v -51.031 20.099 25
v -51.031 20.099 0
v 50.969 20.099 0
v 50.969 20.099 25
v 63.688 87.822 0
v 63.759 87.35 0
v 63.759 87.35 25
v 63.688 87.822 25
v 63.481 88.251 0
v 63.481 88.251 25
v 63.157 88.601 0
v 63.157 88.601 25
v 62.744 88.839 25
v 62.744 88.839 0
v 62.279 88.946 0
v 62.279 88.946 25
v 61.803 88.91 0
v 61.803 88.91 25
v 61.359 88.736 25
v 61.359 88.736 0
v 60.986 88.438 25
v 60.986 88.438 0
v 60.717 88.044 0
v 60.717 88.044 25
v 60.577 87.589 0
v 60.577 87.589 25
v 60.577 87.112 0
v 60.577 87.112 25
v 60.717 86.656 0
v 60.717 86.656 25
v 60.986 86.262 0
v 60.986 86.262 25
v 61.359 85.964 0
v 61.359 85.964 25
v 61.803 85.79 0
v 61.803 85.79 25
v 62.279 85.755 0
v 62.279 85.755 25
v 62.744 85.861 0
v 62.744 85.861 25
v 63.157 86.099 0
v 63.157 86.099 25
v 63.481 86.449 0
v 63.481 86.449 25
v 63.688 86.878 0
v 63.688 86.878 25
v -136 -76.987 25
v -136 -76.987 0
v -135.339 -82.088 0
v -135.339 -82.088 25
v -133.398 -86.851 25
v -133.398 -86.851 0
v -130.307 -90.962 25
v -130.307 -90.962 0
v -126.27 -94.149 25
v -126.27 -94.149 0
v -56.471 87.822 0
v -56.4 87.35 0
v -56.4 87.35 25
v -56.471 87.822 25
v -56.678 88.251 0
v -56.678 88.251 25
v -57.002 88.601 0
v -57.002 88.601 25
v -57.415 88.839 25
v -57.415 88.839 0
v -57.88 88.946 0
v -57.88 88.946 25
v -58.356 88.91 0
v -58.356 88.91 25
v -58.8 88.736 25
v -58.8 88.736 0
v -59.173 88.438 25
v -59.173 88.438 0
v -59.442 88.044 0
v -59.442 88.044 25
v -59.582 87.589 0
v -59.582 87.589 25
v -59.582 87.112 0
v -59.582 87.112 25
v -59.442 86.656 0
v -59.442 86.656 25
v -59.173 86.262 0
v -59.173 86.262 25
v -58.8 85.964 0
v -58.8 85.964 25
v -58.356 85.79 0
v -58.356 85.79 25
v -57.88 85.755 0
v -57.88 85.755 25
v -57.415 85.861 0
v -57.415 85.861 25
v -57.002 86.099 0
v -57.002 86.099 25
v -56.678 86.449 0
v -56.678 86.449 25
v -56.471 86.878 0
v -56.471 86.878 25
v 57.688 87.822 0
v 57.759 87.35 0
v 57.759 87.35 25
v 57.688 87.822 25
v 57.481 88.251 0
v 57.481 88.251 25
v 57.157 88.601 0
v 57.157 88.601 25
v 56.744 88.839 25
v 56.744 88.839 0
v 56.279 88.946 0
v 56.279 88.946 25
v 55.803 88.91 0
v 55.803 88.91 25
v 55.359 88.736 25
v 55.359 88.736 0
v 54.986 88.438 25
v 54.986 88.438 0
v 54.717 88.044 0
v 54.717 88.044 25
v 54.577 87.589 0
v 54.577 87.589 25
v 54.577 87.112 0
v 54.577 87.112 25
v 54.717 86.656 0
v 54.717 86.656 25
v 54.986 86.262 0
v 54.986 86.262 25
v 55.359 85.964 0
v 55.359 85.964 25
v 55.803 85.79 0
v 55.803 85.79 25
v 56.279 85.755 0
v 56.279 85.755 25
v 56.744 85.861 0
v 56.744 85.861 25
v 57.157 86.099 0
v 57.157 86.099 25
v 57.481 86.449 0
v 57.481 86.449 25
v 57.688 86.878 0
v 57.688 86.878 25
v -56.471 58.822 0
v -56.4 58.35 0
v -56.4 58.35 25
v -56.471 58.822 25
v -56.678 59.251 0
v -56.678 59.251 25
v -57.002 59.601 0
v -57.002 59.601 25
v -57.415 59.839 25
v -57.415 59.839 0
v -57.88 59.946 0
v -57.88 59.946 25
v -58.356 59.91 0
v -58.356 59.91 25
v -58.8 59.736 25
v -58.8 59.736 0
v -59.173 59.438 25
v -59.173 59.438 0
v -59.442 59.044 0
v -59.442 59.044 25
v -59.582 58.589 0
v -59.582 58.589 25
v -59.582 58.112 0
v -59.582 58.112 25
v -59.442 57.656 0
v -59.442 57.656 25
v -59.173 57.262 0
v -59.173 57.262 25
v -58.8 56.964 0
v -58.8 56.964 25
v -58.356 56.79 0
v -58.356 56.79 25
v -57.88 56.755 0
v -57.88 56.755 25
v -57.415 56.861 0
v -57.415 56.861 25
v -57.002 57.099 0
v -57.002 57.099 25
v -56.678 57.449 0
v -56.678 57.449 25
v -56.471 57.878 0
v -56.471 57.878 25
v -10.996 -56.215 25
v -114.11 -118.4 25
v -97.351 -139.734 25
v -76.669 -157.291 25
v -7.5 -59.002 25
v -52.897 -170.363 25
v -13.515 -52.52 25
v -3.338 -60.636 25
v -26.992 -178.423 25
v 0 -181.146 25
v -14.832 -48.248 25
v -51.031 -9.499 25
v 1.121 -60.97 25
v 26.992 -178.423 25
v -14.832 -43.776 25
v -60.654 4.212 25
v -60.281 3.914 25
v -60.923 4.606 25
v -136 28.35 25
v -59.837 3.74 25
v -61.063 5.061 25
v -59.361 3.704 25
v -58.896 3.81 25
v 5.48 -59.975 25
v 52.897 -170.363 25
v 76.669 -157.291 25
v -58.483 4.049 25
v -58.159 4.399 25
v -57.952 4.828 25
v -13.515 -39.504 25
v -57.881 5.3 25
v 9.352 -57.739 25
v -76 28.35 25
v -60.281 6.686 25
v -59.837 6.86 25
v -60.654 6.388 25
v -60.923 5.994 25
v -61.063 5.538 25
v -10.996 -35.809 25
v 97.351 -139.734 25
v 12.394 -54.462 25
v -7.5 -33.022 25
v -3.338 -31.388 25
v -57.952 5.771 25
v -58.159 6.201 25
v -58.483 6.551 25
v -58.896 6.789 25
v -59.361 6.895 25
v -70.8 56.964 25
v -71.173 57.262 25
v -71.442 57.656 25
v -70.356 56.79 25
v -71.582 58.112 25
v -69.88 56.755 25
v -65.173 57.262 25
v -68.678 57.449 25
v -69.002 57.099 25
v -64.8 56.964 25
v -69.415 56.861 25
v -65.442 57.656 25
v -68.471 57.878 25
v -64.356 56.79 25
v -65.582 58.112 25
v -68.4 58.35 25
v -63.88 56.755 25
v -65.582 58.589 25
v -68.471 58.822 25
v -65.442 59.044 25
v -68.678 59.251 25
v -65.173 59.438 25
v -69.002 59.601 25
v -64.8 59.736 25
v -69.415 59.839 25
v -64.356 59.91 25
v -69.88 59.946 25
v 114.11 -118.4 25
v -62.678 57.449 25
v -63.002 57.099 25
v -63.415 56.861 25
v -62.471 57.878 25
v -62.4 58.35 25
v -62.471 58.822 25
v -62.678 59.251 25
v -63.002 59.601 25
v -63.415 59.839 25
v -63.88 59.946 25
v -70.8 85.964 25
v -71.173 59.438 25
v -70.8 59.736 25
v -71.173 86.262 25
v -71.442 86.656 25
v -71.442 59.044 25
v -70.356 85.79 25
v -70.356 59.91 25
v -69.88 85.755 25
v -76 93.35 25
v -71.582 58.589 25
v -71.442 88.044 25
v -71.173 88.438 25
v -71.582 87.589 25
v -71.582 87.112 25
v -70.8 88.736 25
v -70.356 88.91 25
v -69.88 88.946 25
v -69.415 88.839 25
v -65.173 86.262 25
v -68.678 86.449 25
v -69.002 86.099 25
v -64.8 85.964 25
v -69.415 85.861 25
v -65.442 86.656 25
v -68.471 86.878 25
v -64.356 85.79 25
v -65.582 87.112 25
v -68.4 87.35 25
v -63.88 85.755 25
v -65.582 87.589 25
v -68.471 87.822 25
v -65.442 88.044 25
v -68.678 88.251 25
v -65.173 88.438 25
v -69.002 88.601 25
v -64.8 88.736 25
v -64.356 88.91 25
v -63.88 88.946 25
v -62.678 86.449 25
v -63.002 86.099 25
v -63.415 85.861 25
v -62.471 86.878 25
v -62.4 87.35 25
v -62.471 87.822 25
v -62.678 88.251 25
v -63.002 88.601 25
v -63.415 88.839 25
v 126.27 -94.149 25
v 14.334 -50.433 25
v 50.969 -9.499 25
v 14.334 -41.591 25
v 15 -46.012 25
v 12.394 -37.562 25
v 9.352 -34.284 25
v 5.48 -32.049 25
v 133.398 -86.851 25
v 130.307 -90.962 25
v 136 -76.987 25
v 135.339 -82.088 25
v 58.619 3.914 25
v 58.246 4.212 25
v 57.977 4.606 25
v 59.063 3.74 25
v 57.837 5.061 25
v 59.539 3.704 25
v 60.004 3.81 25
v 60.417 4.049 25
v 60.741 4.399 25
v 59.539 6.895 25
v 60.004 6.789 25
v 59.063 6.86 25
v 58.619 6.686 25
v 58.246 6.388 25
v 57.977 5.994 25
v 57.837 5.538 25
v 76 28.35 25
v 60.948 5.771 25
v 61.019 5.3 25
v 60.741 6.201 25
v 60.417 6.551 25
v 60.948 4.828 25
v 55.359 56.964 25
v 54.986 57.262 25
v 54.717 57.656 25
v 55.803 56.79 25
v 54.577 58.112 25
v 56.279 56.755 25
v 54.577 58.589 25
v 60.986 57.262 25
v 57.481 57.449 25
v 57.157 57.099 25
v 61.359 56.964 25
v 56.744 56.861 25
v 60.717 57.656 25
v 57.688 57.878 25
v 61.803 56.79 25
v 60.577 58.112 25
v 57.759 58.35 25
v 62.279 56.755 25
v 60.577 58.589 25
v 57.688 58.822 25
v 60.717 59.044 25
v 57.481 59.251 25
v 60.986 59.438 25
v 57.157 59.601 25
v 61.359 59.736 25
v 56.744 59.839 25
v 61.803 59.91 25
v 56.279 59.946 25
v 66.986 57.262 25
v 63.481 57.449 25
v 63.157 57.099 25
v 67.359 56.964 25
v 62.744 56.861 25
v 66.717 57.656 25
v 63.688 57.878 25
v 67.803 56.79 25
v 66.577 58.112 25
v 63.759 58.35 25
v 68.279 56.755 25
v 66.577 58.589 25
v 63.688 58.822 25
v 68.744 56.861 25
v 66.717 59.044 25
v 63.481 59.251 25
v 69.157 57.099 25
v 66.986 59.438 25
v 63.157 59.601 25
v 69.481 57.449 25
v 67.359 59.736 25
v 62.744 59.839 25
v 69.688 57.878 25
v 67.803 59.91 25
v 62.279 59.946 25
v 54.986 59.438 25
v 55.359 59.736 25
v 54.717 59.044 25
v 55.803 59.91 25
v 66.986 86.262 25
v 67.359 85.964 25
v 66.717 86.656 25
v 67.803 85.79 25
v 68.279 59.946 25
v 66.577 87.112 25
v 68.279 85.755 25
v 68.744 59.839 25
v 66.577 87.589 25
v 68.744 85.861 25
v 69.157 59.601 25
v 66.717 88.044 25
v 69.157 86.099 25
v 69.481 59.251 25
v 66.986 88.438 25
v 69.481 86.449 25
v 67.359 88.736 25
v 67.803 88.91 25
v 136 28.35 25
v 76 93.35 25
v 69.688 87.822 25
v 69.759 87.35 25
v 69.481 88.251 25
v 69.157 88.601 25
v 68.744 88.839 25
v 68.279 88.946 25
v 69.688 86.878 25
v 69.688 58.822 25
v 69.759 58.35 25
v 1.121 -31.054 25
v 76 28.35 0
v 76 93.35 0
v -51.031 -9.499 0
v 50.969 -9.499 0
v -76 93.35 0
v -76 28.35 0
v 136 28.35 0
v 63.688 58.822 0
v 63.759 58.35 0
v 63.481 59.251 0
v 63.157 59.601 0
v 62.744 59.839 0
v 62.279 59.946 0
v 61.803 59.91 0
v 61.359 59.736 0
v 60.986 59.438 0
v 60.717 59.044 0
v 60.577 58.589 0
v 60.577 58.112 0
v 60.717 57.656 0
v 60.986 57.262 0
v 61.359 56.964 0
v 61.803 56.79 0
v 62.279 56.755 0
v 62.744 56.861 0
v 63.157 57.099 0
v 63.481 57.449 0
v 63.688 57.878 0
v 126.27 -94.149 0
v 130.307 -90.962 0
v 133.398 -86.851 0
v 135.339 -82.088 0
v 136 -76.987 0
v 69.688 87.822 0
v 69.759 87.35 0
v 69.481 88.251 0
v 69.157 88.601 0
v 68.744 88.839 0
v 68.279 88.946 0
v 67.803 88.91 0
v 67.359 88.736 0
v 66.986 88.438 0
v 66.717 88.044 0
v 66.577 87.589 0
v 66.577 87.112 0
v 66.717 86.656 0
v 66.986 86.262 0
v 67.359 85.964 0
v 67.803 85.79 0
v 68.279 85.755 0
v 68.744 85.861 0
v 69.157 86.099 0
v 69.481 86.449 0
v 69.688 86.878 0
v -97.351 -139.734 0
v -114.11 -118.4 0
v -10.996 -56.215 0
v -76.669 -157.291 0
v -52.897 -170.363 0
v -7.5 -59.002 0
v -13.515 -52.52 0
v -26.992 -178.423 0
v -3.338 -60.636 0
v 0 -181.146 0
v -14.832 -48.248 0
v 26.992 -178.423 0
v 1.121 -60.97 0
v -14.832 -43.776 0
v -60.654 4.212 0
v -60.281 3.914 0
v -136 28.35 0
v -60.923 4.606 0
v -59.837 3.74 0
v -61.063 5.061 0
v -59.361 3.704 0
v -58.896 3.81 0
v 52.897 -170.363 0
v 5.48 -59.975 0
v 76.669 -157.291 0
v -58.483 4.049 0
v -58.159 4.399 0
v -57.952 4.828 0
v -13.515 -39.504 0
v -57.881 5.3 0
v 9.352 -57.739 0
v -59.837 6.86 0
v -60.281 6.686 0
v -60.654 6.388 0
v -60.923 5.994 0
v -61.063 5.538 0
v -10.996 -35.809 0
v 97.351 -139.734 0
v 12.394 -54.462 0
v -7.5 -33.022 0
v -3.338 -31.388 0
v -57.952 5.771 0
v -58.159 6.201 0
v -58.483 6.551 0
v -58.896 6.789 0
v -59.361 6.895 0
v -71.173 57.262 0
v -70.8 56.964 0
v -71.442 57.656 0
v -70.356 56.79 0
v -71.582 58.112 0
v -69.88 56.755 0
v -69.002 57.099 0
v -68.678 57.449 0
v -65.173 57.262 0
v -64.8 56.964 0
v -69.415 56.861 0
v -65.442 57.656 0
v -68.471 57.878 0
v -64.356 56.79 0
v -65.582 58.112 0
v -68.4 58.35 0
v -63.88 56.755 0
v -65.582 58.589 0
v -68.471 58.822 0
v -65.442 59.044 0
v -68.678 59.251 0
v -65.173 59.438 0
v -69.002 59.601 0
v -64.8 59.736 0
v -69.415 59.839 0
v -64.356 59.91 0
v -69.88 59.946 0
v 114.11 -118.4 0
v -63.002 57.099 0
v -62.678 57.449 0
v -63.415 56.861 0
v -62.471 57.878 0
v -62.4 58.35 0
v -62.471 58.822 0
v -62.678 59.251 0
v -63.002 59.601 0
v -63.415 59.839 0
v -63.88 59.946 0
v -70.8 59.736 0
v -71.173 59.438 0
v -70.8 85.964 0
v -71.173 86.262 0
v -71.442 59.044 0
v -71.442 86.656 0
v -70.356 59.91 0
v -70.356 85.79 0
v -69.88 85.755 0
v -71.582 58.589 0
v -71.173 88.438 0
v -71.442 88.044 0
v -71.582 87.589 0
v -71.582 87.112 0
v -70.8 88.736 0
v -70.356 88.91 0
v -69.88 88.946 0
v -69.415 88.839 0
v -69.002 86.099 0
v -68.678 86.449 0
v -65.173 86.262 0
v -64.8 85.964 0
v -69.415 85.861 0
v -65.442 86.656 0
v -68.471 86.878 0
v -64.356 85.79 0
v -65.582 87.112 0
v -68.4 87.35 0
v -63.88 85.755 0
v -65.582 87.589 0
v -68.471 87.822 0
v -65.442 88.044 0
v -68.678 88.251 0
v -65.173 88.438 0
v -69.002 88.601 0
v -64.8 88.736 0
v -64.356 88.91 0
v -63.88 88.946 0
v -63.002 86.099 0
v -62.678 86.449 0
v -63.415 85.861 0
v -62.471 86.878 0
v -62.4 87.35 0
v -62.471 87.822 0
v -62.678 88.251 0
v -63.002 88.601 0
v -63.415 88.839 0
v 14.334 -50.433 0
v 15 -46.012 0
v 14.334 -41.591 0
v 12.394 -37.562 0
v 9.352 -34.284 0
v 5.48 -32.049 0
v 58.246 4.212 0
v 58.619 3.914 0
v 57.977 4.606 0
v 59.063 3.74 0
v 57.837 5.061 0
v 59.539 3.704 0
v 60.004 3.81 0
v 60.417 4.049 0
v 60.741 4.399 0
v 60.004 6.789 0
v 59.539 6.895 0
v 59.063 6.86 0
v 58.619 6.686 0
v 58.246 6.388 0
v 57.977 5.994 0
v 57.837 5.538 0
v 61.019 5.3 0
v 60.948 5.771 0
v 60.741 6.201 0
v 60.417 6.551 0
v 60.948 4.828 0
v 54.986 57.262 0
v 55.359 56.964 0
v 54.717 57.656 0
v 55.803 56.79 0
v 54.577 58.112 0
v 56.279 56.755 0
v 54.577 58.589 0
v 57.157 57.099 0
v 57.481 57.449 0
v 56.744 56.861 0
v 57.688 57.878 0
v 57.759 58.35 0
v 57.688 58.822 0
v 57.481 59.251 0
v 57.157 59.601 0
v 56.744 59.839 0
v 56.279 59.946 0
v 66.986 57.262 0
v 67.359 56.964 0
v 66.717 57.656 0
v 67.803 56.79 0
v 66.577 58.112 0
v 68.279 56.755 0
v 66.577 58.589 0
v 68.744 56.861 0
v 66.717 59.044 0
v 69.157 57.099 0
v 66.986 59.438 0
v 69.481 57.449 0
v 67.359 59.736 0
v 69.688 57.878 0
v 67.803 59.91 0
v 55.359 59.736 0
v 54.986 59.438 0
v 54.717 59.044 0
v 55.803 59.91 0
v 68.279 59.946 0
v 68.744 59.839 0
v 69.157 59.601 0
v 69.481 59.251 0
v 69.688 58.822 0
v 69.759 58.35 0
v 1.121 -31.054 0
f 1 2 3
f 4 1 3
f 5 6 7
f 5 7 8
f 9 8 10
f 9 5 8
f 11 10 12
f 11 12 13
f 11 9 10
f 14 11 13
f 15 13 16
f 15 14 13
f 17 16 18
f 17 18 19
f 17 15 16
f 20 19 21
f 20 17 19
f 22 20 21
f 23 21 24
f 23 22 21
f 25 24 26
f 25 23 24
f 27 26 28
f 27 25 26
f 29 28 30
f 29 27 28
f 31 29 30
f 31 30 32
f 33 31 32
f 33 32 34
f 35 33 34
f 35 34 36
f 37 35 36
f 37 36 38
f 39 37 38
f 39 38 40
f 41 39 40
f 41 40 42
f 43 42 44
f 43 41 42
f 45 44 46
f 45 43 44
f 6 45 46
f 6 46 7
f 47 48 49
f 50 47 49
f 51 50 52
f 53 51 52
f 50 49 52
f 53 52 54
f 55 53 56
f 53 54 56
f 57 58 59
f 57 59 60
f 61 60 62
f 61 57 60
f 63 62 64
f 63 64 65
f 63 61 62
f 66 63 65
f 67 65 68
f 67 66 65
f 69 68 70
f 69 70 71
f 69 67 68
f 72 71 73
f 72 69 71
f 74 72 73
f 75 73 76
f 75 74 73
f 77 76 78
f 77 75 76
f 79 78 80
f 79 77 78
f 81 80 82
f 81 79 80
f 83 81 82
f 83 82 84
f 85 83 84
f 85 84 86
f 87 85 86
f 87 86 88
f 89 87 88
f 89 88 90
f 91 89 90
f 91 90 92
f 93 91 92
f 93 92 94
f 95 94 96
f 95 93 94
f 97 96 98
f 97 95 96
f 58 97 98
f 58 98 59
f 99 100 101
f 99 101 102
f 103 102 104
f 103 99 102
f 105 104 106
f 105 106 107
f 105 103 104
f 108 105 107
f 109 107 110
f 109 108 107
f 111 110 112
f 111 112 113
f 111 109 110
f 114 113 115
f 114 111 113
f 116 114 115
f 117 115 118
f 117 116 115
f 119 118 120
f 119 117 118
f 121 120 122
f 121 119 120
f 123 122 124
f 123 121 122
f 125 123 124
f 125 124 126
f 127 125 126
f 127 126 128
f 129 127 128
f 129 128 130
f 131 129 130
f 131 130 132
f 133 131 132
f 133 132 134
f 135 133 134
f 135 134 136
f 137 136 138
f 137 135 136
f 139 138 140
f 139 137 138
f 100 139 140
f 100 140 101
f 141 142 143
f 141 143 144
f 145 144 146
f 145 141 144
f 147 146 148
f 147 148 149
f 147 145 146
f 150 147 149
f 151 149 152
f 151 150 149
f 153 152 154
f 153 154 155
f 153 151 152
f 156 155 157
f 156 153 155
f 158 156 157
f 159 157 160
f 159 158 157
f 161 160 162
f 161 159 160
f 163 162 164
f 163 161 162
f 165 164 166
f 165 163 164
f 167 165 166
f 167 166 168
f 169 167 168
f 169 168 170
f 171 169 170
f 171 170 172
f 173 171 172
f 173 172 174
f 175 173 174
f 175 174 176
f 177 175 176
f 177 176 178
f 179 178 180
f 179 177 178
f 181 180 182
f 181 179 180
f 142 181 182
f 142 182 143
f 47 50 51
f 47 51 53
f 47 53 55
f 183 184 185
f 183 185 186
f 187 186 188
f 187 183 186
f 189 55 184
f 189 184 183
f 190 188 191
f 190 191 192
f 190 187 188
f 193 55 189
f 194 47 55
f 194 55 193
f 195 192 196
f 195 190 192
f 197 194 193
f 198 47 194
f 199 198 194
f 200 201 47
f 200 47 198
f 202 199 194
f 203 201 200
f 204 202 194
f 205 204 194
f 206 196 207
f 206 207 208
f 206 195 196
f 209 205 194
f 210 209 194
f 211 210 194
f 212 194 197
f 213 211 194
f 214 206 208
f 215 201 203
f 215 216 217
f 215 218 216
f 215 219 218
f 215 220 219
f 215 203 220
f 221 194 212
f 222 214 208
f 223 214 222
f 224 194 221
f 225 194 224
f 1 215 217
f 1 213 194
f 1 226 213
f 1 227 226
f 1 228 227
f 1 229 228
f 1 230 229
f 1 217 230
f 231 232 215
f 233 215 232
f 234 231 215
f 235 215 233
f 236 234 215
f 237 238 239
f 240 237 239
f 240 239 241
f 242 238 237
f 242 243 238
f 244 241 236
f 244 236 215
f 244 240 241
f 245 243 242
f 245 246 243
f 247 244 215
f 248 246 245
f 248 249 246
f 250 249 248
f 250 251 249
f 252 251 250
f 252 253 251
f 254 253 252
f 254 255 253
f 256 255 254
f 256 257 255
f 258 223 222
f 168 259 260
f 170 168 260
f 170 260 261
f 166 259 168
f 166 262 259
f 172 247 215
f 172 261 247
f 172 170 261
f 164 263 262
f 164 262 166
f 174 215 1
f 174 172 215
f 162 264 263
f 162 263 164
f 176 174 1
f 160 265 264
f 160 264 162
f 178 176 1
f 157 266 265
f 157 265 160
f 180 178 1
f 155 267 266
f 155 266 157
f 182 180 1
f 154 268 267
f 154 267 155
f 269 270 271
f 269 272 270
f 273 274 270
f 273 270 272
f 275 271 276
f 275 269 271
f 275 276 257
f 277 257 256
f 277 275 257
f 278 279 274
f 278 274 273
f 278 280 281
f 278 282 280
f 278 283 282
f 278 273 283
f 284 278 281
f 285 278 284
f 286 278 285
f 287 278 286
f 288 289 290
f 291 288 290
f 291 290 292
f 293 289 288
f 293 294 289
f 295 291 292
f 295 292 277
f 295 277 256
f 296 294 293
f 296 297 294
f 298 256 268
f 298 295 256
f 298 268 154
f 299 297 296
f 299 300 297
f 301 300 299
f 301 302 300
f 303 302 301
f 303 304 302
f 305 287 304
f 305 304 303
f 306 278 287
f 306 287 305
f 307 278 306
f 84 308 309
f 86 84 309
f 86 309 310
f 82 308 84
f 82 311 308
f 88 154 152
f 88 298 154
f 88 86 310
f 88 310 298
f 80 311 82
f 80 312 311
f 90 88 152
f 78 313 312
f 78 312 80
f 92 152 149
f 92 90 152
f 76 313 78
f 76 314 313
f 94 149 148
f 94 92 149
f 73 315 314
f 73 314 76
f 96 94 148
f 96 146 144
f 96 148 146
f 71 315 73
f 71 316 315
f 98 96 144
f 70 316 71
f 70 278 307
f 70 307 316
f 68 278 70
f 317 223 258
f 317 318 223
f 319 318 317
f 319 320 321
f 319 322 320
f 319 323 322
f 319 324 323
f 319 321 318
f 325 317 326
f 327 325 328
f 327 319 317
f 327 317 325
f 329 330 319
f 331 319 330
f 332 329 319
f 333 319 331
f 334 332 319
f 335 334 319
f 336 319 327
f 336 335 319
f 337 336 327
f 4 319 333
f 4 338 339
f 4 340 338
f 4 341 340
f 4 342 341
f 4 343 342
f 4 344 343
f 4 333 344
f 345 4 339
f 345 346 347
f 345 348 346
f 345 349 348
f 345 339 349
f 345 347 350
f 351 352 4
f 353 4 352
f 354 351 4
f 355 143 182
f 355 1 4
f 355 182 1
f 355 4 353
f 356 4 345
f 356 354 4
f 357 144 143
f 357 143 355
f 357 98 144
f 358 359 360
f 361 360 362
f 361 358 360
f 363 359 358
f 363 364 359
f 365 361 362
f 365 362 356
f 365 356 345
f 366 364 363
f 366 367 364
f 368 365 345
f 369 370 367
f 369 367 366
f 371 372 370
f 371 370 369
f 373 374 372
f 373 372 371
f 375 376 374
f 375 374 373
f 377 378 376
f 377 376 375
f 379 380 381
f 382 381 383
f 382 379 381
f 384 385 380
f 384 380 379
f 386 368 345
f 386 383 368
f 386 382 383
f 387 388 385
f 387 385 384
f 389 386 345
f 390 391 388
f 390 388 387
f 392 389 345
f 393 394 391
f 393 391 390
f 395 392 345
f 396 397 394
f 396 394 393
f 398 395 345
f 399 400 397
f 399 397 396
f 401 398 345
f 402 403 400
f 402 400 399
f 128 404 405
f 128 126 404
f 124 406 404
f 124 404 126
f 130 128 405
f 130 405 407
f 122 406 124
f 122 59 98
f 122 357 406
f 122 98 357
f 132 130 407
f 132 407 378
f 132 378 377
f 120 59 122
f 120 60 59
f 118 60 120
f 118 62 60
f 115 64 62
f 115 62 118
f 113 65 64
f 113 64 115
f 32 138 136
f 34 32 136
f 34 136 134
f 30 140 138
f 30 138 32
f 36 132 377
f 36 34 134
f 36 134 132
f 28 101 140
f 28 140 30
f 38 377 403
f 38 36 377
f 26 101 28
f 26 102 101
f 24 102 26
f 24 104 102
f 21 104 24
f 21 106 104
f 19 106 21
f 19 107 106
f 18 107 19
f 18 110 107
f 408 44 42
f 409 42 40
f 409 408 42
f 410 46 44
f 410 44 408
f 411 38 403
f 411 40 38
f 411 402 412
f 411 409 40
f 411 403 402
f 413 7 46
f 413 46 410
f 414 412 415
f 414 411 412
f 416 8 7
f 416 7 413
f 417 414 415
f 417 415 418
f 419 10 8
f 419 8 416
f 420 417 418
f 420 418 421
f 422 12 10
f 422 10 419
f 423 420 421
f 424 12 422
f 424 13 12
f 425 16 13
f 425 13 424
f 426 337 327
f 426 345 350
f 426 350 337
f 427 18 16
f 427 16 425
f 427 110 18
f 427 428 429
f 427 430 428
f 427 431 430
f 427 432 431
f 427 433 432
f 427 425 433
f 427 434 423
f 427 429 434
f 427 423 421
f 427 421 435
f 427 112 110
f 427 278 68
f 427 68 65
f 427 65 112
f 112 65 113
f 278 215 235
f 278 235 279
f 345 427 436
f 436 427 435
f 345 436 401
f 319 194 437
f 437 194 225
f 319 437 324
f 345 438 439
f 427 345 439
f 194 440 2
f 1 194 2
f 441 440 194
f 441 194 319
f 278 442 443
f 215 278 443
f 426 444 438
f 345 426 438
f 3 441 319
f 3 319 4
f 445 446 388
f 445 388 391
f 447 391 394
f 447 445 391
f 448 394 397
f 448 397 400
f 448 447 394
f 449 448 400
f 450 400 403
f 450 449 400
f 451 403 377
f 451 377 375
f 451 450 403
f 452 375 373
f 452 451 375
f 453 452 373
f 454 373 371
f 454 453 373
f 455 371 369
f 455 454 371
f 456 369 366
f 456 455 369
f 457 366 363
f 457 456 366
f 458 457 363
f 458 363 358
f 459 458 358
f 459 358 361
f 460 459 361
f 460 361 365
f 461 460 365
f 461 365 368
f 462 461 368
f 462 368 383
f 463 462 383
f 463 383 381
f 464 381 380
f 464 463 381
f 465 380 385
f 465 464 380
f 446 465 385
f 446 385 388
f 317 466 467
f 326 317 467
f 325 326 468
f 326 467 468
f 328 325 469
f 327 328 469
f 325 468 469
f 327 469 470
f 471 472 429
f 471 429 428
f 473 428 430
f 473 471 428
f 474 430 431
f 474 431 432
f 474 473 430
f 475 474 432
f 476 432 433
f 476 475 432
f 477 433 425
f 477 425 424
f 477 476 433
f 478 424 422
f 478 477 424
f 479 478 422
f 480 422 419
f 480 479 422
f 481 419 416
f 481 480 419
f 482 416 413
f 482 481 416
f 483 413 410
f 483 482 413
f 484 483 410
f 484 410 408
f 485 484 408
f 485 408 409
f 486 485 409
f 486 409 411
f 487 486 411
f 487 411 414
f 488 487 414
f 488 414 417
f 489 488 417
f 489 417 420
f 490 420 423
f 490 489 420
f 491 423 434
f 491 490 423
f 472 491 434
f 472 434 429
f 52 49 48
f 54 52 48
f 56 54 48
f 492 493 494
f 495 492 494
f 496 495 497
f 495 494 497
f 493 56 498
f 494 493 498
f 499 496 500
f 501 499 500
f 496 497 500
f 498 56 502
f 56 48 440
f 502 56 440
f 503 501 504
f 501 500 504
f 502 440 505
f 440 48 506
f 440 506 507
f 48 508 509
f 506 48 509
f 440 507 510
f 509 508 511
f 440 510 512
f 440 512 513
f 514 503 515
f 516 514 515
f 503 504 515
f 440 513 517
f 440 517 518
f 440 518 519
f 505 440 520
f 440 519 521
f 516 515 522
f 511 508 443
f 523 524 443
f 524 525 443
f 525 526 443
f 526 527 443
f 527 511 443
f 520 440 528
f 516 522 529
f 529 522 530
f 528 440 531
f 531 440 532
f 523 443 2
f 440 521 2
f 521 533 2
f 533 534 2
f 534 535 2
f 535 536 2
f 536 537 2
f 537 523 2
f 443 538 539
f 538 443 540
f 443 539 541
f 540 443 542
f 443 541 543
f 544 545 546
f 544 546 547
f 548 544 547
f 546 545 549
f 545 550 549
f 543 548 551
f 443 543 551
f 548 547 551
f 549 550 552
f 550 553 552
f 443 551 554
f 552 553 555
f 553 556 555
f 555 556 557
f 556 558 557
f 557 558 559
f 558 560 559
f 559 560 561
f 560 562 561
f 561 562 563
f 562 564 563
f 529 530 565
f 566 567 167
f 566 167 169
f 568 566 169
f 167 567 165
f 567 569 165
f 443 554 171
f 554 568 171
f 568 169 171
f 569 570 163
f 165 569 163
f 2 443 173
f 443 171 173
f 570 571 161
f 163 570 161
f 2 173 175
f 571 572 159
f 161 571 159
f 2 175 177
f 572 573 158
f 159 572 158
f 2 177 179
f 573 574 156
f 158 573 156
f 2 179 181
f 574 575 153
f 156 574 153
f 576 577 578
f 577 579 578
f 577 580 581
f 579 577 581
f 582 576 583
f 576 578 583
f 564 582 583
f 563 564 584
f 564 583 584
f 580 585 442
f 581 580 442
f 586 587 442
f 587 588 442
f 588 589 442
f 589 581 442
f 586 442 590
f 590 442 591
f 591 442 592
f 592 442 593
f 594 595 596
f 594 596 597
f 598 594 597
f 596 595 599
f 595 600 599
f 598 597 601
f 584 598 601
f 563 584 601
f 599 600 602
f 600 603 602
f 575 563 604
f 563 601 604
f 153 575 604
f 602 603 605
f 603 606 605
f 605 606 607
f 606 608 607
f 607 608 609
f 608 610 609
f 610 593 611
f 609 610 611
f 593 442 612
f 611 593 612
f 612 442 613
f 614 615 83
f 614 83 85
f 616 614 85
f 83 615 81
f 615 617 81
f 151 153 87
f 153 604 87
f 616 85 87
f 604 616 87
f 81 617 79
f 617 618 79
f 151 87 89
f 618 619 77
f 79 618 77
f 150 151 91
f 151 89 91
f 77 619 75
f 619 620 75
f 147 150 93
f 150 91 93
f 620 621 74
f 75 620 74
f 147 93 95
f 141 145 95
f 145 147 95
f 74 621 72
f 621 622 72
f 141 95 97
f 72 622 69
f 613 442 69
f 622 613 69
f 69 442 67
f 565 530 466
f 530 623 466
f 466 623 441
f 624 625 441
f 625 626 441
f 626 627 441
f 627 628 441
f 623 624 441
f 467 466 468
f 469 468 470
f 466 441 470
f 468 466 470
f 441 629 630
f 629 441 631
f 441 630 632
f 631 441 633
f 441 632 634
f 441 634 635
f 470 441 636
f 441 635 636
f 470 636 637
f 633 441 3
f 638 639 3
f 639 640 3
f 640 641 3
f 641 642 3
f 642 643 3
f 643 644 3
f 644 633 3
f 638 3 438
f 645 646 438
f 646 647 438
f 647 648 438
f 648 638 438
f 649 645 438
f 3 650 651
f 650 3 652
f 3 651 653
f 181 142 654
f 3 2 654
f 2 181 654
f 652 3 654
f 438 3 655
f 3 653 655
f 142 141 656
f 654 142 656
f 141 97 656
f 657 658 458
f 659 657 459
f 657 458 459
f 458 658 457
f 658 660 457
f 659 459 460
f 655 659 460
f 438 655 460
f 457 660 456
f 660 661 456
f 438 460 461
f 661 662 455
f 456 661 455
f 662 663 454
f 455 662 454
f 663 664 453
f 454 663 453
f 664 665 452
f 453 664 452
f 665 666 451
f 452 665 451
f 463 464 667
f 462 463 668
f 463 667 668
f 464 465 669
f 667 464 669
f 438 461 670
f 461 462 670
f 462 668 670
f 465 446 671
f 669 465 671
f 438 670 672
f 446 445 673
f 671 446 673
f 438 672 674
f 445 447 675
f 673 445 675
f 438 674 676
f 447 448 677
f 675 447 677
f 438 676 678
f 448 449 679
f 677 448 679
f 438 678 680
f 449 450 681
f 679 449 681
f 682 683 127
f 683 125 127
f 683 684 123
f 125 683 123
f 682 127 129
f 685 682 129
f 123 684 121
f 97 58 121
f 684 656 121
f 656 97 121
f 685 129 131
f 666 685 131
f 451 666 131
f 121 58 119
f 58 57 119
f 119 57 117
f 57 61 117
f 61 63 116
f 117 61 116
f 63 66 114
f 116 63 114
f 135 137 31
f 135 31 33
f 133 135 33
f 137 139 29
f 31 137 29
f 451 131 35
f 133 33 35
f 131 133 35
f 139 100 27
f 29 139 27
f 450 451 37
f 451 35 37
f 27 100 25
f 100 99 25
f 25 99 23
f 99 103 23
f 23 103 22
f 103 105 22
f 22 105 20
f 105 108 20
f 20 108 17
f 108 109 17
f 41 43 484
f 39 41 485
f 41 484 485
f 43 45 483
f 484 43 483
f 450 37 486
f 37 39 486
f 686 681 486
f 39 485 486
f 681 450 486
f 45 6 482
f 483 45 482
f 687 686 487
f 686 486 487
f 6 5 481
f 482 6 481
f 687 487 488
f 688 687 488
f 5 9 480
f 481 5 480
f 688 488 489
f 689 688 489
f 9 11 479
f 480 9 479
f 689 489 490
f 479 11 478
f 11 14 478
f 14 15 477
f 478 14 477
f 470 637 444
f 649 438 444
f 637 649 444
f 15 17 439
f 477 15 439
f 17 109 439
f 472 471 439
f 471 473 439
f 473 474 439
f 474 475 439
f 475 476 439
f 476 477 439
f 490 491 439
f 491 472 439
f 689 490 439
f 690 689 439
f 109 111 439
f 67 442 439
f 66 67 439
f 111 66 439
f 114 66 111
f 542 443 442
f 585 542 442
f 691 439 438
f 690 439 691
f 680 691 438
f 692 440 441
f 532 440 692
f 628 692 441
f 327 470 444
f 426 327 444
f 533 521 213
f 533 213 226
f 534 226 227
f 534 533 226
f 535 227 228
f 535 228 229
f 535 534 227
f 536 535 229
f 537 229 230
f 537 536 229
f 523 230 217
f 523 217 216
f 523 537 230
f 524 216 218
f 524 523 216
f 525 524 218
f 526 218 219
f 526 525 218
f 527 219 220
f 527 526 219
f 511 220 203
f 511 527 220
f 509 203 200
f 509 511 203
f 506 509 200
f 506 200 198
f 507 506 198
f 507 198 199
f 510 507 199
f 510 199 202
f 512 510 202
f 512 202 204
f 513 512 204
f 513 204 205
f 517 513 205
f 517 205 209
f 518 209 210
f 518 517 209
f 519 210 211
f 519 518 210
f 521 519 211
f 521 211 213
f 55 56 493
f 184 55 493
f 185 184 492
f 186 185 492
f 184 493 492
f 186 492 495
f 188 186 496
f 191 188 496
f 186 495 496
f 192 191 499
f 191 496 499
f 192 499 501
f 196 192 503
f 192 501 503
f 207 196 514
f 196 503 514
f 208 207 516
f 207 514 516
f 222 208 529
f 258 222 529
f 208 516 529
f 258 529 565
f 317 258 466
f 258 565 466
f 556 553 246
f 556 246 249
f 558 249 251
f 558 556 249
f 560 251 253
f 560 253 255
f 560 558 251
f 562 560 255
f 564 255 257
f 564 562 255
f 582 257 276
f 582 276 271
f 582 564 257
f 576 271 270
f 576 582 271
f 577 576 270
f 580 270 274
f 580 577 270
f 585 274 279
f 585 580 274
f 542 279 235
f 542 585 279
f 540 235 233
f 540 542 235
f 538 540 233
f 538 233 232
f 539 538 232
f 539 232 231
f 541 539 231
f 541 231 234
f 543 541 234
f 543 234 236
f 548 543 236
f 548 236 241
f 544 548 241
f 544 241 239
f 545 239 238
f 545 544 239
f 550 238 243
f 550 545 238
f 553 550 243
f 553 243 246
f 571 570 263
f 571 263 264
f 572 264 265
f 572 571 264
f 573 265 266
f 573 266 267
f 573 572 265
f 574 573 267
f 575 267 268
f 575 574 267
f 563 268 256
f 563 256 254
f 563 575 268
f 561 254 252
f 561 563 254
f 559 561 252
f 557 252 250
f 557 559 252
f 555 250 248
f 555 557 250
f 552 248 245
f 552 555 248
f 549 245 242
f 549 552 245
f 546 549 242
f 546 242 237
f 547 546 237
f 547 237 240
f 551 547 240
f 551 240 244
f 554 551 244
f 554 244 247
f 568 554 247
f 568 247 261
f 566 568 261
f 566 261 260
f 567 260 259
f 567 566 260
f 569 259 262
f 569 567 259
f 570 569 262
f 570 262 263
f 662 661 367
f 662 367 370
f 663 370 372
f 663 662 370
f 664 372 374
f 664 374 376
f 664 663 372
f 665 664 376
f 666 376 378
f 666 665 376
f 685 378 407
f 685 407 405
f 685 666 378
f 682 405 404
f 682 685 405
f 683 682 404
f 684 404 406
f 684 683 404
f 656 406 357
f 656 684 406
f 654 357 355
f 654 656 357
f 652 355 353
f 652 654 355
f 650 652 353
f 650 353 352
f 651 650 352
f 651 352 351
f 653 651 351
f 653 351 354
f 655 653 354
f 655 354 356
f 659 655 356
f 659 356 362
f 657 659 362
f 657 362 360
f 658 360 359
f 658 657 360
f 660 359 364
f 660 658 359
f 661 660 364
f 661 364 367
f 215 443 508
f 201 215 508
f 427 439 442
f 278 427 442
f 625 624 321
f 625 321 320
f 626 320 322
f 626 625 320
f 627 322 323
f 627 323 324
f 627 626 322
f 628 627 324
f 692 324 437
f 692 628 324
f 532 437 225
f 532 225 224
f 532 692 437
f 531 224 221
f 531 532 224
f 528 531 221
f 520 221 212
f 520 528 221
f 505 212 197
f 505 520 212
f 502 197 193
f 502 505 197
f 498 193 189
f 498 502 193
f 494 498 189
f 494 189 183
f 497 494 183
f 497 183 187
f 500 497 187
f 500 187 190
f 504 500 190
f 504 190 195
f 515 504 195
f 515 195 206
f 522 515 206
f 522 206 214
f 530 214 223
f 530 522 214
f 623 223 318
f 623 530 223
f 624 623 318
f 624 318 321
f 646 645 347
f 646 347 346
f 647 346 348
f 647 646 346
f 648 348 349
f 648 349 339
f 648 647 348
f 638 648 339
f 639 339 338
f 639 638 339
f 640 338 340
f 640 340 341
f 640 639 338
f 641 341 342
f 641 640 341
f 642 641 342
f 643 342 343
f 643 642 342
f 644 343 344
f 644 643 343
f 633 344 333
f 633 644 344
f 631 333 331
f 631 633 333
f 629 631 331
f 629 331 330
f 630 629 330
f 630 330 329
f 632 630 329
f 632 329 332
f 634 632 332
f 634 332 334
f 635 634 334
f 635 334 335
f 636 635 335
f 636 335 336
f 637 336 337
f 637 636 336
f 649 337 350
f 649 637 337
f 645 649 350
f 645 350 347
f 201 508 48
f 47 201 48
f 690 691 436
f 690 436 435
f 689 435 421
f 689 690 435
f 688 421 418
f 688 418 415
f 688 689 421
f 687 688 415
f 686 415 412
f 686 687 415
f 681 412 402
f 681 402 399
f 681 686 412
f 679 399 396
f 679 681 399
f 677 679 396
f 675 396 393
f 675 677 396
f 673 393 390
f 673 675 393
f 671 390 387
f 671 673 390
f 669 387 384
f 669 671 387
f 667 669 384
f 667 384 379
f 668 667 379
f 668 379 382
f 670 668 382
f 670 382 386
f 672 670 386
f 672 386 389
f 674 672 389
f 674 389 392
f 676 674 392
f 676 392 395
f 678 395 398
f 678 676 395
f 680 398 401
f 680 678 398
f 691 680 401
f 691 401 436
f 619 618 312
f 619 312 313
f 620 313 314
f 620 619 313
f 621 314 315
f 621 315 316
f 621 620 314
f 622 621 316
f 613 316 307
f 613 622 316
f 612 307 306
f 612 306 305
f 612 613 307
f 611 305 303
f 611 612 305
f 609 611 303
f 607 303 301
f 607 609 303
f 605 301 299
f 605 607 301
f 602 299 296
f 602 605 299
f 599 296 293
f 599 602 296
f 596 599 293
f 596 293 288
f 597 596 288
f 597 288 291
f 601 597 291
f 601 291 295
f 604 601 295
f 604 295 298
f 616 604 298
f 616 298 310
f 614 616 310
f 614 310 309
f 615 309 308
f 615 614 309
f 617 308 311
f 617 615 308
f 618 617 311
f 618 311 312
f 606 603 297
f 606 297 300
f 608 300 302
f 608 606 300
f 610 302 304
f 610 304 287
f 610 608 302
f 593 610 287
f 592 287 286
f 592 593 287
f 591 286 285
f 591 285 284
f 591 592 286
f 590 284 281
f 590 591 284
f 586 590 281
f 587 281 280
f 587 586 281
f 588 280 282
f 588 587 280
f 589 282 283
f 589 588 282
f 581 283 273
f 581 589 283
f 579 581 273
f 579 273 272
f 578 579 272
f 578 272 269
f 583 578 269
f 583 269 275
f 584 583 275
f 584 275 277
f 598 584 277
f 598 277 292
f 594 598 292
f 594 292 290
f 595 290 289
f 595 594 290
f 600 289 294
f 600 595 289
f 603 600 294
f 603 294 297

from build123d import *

# Parameters (mm, degrees)
F0_R     = 15
F0_R_2   = 1.6
F0_W     = 102
F0_H     = 29.597664
F1_DEPTH = 25
F2_DEPTH = 25


with BuildPart() as f1:
    # F0 (on Top) → F1 (new body)
    with BuildSketch(Plane.XY):
        with BuildLine():
            Line((76, 93.350048), (0, 93.350048))
            Line((0, 93.350048), (-76, 93.350048))
            Line((-76, 93.350048), (-76, 28.350048))
            Line((-76, 28.350048), (-136, 28.350048))
            Line((-136, 28.350048), (-136, -76.986715))
            ThreePointArc((-136, -76.986715), (-133.398174, -86.850972), (-126.269644, -94.14872))
            ThreePointArc((-126.269644, -94.14872), (0, -181.145858), (126.269644, -94.14872))
            ThreePointArc((126.269644, -94.14872), (133.398174, -86.850972), (136, -76.986715))
            Line((136, -76.986715), (136, 28.350048))
            Line((136, 28.350048), (76, 28.350048))
            Line((76, 28.350048), (76, 93.350048))
        make_face()
        with Locations((0, -46.011958)):
            Circle(F0_R, mode=Mode.SUBTRACT)
        with Locations((-59.481014, 5.299877)):
            Circle(F0_R_2, mode=Mode.SUBTRACT)
        with Locations((-0.031014, 5.299877)):
            Rectangle(F0_W, F0_H, mode=Mode.SUBTRACT)
        with Locations((-70, 58.350048)):
            Circle(F0_R_2, mode=Mode.SUBTRACT)
        with Locations((-70, 87.350048)):
            Circle(F0_R_2, mode=Mode.SUBTRACT)
        with Locations((-64, 58.350048)):
            Circle(F0_R_2, mode=Mode.SUBTRACT)
        with Locations((-58, 58.350048)):
            Circle(F0_R_2, mode=Mode.SUBTRACT)
        with Locations((-64, 87.350048)):
            Circle(F0_R_2, mode=Mode.SUBTRACT)
        with Locations((-58, 87.350048)):
            Circle(F0_R_2, mode=Mode.SUBTRACT)
        with Locations((59.418986, 5.299877)):
            Circle(F0_R_2, mode=Mode.SUBTRACT)
        with Locations((56.15901, 58.350048)):
            Circle(F0_R_2, mode=Mode.SUBTRACT)
        with Locations((62.15901, 58.350048)):
            Circle(F0_R_2, mode=Mode.SUBTRACT)
        with Locations((56.15901, 87.350048)):
            Circle(F0_R_2, mode=Mode.SUBTRACT)
        with Locations((62.15901, 87.350048)):
            Circle(F0_R_2, mode=Mode.SUBTRACT)
        with Locations((68.15901, 58.350048)):
            Circle(F0_R_2, mode=Mode.SUBTRACT)
        with Locations((68.15901, 87.350048)):
            Circle(F0_R_2, mode=Mode.SUBTRACT)
    extrude(amount=F1_DEPTH)

    # F0 (on Top) → F2 (join)
    with BuildSketch(Plane.XY):
        with BuildLine():
            Line((76, 93.350048), (0, 93.350048))
            Line((0, 93.350048), (-76, 93.350048))
            Line((-76, 93.350048), (-76, 28.350048))
            Line((-76, 28.350048), (-136, 28.350048))
            Line((-136, 28.350048), (-136, -76.986715))
            ThreePointArc((-136, -76.986715), (-133.398174, -86.850972), (-126.269644, -94.14872))
            ThreePointArc((-126.269644, -94.14872), (0, -181.145858), (126.269644, -94.14872))
            ThreePointArc((126.269644, -94.14872), (133.398174, -86.850972), (136, -76.986715))
            Line((136, -76.986715), (136, 28.350048))
            Line((136, 28.350048), (76, 28.350048))
            Line((76, 28.350048), (76, 93.350048))
        make_face()
        with Locations((0, -46.011958)):
            Circle(F0_R, mode=Mode.SUBTRACT)
        with Locations((-59.481014, 5.299877)):
            Circle(F0_R_2, mode=Mode.SUBTRACT)
        with Locations((-0.031014, 5.299877)):
            Rectangle(F0_W, F0_H, mode=Mode.SUBTRACT)
        with Locations((-70, 58.350048)):
            Circle(F0_R_2, mode=Mode.SUBTRACT)
        with Locations((-70, 87.350048)):
            Circle(F0_R_2, mode=Mode.SUBTRACT)
        with Locations((-64, 58.350048)):
            Circle(F0_R_2, mode=Mode.SUBTRACT)
        with Locations((-58, 58.350048)):
            Circle(F0_R_2, mode=Mode.SUBTRACT)
        with Locations((-64, 87.350048)):
            Circle(F0_R_2, mode=Mode.SUBTRACT)
        with Locations((-58, 87.350048)):
            Circle(F0_R_2, mode=Mode.SUBTRACT)
        with Locations((59.418986, 5.299877)):
            Circle(F0_R_2, mode=Mode.SUBTRACT)
        with Locations((56.15901, 58.350048)):
            Circle(F0_R_2, mode=Mode.SUBTRACT)
        with Locations((62.15901, 58.350048)):
            Circle(F0_R_2, mode=Mode.SUBTRACT)
        with Locations((56.15901, 87.350048)):
            Circle(F0_R_2, mode=Mode.SUBTRACT)
        with Locations((62.15901, 87.350048)):
            Circle(F0_R_2, mode=Mode.SUBTRACT)
        with Locations((68.15901, 58.350048)):
            Circle(F0_R_2, mode=Mode.SUBTRACT)
        with Locations((68.15901, 87.350048)):
            Circle(F0_R_2, mode=Mode.SUBTRACT)
    extrude(amount=F2_DEPTH)


solid = f1.part
